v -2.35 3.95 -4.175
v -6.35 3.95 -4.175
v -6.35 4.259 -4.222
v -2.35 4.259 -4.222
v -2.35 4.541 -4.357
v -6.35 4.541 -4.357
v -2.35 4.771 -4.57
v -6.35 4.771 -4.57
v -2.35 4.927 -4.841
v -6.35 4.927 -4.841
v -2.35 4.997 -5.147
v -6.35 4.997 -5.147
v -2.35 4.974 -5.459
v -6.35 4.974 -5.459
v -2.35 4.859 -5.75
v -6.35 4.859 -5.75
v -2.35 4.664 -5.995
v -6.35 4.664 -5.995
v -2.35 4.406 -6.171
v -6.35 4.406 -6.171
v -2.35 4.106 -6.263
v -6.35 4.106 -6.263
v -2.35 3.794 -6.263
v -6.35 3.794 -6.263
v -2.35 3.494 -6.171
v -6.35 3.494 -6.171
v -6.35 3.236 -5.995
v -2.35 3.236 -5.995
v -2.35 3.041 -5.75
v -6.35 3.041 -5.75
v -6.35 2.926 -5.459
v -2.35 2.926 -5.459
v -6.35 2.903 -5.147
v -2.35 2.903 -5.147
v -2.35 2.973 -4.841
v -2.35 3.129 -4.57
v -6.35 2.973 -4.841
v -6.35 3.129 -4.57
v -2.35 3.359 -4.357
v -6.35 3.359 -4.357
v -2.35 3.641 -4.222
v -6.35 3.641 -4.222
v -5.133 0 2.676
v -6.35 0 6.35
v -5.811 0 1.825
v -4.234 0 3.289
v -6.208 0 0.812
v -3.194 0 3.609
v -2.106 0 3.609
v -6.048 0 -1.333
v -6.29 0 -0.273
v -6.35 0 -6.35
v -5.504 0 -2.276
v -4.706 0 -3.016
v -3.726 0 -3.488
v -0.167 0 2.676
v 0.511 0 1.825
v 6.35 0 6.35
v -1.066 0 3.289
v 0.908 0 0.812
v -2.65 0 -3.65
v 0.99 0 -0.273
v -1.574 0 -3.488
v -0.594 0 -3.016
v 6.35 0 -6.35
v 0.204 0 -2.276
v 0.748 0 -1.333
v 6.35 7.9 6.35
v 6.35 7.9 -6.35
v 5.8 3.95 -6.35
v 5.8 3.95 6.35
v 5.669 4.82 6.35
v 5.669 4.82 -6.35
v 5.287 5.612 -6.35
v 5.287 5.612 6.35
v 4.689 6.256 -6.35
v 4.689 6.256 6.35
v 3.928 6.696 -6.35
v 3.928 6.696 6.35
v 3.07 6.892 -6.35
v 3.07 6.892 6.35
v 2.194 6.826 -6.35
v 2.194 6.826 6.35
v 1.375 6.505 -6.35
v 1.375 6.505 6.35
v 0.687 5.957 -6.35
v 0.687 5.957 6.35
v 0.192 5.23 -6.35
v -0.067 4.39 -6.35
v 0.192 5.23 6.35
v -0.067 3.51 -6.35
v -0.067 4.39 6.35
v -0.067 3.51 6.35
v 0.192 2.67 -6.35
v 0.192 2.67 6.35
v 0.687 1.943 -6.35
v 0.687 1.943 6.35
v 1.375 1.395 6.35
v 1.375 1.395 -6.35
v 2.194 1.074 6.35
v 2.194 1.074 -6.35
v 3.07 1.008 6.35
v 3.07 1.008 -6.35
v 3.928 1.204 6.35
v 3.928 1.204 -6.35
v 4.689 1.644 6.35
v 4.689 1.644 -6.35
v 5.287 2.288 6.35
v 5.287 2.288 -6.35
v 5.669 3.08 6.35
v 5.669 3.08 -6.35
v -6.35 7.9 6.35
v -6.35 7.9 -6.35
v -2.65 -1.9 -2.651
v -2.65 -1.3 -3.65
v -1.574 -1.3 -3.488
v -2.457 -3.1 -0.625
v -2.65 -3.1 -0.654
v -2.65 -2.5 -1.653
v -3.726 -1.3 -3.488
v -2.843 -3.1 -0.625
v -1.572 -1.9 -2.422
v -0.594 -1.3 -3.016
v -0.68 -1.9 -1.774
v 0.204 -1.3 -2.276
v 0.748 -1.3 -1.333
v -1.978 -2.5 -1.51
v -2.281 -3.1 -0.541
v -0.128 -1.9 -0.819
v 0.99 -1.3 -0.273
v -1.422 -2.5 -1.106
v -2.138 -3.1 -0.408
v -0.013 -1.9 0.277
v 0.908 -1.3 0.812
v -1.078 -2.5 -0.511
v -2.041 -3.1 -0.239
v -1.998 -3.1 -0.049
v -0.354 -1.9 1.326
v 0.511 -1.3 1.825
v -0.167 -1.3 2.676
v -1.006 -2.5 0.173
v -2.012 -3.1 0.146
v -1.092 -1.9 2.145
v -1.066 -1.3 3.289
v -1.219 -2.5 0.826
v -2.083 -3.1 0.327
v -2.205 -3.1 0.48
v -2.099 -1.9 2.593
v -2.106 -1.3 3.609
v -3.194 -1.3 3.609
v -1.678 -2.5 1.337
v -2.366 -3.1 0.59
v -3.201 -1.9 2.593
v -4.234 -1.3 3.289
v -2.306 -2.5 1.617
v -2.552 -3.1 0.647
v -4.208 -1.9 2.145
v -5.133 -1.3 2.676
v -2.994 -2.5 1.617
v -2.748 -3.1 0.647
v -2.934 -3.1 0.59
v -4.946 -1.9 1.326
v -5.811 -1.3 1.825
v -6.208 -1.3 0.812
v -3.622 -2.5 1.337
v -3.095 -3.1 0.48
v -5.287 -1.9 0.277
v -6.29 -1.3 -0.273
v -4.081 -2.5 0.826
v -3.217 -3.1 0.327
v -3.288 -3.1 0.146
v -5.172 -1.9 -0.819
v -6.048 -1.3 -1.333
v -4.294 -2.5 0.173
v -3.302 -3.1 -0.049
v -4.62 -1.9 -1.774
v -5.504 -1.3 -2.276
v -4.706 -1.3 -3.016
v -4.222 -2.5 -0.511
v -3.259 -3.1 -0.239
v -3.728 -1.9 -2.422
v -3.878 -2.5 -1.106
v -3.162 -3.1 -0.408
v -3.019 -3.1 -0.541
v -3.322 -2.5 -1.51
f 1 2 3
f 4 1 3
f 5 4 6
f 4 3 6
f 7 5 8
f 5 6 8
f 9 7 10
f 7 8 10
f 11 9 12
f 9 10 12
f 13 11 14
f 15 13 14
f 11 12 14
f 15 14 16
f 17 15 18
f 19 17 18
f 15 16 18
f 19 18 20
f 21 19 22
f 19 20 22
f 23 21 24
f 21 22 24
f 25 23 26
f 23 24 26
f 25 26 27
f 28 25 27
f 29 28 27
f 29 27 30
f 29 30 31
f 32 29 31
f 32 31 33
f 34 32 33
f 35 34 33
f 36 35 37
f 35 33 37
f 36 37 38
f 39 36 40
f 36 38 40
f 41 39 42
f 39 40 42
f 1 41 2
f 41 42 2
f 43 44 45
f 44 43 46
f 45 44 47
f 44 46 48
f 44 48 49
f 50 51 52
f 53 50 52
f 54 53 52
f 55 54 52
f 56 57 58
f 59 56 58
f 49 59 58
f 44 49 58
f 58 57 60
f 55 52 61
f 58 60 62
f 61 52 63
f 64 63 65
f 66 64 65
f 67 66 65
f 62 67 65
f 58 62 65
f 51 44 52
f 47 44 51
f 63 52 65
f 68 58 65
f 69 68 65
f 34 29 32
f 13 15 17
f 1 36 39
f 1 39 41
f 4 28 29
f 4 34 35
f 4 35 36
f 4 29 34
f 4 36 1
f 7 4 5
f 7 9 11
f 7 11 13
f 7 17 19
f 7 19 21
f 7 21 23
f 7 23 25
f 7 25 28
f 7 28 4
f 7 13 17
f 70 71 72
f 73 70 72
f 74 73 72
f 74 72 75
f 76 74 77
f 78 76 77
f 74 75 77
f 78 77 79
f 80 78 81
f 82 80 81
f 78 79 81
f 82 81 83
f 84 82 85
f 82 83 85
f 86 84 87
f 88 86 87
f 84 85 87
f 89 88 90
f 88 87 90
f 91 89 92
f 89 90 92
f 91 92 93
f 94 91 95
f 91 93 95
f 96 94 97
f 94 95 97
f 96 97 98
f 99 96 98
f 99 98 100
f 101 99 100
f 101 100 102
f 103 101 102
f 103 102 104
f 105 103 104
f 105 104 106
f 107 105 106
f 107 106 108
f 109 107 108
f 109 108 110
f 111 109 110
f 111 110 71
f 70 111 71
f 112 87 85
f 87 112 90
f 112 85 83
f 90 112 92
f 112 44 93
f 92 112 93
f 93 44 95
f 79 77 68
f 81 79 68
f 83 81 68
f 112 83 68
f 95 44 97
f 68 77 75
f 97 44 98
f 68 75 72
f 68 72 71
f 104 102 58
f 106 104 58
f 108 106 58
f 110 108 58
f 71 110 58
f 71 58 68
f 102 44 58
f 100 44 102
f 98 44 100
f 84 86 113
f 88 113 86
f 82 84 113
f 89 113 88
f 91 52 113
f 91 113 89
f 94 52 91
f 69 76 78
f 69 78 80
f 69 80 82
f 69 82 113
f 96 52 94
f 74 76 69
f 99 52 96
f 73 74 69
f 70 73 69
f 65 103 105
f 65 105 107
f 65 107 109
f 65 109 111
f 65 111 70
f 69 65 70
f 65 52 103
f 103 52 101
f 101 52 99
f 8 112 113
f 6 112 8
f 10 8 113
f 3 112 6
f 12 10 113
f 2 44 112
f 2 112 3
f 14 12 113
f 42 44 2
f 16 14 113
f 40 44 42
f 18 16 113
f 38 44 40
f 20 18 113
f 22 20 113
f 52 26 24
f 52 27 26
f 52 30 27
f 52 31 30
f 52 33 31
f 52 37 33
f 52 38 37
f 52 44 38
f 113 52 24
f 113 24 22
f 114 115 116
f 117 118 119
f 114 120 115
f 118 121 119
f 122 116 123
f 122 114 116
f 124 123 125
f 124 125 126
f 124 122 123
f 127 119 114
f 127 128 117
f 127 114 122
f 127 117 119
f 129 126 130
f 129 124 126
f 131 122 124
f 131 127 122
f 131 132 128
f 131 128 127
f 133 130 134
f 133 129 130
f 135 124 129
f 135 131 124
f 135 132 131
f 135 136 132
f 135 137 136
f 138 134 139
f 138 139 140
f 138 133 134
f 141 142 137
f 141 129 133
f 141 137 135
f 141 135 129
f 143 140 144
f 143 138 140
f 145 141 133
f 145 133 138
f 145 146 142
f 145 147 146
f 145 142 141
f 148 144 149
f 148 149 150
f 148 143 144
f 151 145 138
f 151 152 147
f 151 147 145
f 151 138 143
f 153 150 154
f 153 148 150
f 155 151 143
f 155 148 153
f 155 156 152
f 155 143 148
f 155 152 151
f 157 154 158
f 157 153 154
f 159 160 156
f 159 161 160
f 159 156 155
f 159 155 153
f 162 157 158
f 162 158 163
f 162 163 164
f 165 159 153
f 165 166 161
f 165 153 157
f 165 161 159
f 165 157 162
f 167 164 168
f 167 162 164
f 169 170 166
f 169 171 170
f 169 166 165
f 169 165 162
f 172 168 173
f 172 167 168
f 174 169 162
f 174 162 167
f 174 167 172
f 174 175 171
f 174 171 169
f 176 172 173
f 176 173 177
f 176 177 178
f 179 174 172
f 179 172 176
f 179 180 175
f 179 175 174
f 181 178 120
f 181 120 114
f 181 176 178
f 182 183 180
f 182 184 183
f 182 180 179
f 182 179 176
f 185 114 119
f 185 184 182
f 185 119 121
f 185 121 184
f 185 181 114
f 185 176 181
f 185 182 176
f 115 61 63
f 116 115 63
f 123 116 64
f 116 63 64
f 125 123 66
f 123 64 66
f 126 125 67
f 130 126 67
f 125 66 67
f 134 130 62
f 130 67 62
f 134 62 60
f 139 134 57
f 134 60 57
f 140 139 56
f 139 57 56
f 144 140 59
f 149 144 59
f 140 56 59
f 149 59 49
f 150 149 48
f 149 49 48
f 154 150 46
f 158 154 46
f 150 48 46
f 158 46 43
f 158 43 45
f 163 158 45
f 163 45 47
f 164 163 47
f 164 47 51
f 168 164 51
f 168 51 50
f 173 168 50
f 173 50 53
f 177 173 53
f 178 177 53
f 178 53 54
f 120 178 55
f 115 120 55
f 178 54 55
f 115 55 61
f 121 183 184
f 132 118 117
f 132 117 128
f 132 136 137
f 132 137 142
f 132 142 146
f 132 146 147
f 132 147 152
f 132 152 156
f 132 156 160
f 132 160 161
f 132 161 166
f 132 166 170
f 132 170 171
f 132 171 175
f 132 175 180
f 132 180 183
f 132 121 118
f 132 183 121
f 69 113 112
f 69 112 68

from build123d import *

# Parameters (mm, degrees)
SKETCH1_W           = 12.7
SKETCH1_H           = 12.7
BOSS_EXTRUDE1_DEPTH = 7.9
SKETCH2_R           = 2.95
CUT_EXTRUDE1_DEPTH  = 17.248769184
SKETCH3_R           = 3.65
BOSS_EXTRUDE2_DEPTH = 3.1
CHAMFER1_SIZE       = 1.8
CHAMFER1_SIZE2      = 2.995703068
SKETCH4_R           = 1.05
CUT_EXTRUDE2_DEPTH  = 4


with BuildPart() as part:
    # Sketch1 → Boss-Extrude1 (new body)
    with BuildSketch(Plane(origin=(0, 0, 0), x_dir=(1, 0, 0), z_dir=(0, 1, 0))):
        Rectangle(SKETCH1_W, SKETCH1_H)
    extrude(amount=BOSS_EXTRUDE1_DEPTH)

    # Sketch2 → Cut-Extrude1 (cut, through all)
    with BuildSketch(Plane.XY.offset(6.35)):
        with Locations((2.85, 3.95)):
            Circle(SKETCH2_R)
    extrude(amount=-CUT_EXTRUDE1_DEPTH, mode=Mode.SUBTRACT)

    # Sketch3 → Boss-Extrude2 (add)
    with BuildSketch(Plane.XZ):
        with Locations(Location((-2.65, 0, 0), (0, 0, 270))):
            Circle(SKETCH3_R)
    extrude(amount=BOSS_EXTRUDE2_DEPTH)

    # Chamfer1
    chamfer1_edges = [part.edges().sort_by_distance(p)[0] for p in [
        (-2.65, -3.1, 3.65),
    ]]
    chamfer1_side = [part.faces().sort_by_distance(p)[0] for p in [
        (-2.65, -1.55, 3.65),
    ]]
    chamfer(chamfer1_edges, length=CHAMFER1_SIZE, length2=CHAMFER1_SIZE2, reference=chamfer1_side[0])

    # Sketch4 → Cut-Extrude2 (cut)
    with BuildSketch(Plane.ZY.offset(6.35)):
        with Locations((-5.225, 3.95)):
            Circle(SKETCH4_R)
    extrude(amount=-CUT_EXTRUDE2_DEPTH, mode=Mode.SUBTRACT)


solid = part.part
